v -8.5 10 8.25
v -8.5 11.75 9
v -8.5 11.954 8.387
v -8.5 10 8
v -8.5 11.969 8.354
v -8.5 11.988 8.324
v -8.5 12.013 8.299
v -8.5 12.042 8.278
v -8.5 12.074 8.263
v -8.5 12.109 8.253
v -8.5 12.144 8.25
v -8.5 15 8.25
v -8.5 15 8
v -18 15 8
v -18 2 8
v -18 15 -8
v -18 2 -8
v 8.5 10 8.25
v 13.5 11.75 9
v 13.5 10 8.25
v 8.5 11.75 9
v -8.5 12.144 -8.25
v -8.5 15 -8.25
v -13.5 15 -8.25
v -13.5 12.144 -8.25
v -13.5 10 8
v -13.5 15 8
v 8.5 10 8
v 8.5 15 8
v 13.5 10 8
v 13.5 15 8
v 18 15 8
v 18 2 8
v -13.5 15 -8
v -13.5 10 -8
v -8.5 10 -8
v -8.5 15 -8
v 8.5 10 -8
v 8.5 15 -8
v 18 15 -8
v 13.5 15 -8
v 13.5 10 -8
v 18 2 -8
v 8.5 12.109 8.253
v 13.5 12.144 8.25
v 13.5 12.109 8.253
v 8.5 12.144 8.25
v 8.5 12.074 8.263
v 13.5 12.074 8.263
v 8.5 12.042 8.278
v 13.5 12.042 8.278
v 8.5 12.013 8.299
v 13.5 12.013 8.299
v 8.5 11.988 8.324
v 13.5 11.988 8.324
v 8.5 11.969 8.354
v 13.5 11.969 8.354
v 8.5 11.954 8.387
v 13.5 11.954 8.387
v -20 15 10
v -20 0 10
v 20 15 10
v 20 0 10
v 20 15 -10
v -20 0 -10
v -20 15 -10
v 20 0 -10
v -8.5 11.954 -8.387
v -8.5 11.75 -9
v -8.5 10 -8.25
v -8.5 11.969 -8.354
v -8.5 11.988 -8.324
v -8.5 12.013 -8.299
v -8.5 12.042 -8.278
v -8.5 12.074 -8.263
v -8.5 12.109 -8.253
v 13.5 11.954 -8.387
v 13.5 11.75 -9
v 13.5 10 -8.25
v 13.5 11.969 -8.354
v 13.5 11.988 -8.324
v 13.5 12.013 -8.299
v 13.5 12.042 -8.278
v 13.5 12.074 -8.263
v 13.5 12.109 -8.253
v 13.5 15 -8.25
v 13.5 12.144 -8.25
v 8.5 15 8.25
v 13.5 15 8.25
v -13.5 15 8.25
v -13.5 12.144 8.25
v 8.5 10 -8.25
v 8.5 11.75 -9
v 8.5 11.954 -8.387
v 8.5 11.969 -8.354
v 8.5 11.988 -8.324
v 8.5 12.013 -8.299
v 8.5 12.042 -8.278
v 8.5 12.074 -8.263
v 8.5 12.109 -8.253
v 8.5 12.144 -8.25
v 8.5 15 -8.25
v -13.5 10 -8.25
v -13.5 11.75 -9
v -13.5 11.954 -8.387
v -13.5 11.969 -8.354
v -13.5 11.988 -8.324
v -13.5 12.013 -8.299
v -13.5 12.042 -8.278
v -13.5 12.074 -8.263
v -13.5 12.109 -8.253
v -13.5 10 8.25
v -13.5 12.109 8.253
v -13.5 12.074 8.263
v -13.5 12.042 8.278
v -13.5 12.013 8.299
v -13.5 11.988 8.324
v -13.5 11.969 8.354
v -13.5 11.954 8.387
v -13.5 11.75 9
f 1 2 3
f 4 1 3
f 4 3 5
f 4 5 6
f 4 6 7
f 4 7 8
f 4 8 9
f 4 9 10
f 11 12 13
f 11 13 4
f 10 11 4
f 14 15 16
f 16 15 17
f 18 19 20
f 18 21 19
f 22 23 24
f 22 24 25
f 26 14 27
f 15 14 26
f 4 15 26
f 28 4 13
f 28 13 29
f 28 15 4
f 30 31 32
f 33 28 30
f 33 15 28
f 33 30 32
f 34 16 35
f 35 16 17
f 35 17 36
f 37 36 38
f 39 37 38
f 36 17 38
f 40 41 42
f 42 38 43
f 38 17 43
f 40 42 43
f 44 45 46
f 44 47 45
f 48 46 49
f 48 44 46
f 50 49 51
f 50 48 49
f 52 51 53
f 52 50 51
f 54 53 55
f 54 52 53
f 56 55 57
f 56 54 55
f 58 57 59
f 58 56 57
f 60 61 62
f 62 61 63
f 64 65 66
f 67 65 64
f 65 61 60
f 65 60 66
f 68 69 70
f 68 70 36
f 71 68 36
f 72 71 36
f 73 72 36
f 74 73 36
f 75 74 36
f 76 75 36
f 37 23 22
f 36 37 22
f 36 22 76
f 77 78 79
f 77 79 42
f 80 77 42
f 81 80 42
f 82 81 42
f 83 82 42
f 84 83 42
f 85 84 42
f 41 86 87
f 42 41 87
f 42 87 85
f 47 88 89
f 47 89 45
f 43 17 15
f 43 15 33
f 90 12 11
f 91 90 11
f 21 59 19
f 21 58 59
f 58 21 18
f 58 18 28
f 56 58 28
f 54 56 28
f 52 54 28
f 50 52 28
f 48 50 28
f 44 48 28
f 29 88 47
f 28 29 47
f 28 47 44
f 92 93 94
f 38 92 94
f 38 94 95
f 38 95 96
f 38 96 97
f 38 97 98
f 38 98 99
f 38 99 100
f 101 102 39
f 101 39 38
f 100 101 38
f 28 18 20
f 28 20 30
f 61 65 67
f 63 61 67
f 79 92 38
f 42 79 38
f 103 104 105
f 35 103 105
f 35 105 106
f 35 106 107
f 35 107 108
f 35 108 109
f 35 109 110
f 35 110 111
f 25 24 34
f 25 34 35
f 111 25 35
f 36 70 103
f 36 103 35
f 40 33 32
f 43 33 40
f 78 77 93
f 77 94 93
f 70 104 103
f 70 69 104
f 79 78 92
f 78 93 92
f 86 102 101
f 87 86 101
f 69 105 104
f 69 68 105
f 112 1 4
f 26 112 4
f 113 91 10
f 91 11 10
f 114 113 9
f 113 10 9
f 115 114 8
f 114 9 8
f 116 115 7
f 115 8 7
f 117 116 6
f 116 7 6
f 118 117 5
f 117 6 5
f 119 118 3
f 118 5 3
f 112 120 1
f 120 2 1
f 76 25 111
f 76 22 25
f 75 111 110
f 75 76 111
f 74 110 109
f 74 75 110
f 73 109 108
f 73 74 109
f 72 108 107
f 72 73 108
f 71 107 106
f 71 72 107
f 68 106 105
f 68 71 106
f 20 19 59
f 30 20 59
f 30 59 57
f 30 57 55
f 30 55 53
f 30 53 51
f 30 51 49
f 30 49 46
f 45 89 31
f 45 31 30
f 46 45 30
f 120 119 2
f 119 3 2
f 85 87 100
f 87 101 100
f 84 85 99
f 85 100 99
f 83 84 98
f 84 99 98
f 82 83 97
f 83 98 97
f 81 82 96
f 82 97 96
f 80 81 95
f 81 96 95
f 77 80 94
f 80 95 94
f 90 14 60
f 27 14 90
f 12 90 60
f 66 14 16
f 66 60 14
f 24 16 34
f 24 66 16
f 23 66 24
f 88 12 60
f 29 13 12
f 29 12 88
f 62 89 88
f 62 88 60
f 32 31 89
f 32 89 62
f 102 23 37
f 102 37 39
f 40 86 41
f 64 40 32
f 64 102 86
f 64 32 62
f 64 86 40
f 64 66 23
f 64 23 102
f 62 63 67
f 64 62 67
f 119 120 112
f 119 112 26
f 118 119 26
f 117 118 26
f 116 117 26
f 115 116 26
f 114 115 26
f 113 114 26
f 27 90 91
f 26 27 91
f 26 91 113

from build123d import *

# Parameters (mm, degrees)
SKETCH1_W            = 40
SKETCH1_H            = 20
BOSS_EXTRUDE1_DEPTH  = 15
SHELL2_T             = -2
CUT_EXTRUDE1_START   = -11
CUT_EXTRUDE1_DEPTH   = 2.5
MIRROR2_START        = -11
MIRROR2_COPY_1_DEPTH = 2.5


with BuildPart() as part:
    # Sketch1 → Boss-Extrude1 (new body)
    with BuildSketch(Plane(origin=(0, 0, 0), x_dir=(1, 0, 0), z_dir=(0, 1, 0))):
        Rectangle(SKETCH1_W, SKETCH1_H)
    extrude(amount=BOSS_EXTRUDE1_DEPTH)

    # Shell2
    shell2_openings = [part.faces().sort_by_distance(p)[0] for p in [
        (0, 15, 0),
    ]]
    offset(amount=SHELL2_T, openings=shell2_openings, kind=Kind.INTERSECTION)

    # Sketch2 → Cut-Extrude1 (cut, symmetric)
    with BuildSketch(Plane(origin=(0, 0, 0), x_dir=(0, 0, -1), z_dir=(1, 0, 0)).offset(CUT_EXTRUDE1_START)):
        with BuildLine():
            Line((8.25, 15), (8.25, 12.144151844))
            ThreePointArc((8.25, 12.144151844), (8.287751563, 12.027209787), (8.386754447, 11.954415184))
            Line((8.386754447, 11.954415184), (9, 11.75))
            Line((9, 11.75), (8.25, 10))
            Line((8.25, 10), (7.25, 10))
            Line((7.25, 10), (7.25, 15))
            Line((7.25, 15), (8.25, 15))
        make_face()
    cut_extrude1 = extrude(amount=CUT_EXTRUDE1_DEPTH, both=True, mode=Mode.SUBTRACT)

    # Mirror1: Cut-Extrude1 across plane
    add(cut_extrude1.mirror(Plane(origin=(0, 0, 0), x_dir=(0, 0, 1), z_dir=(1, 0, 0))), mode=Mode.SUBTRACT)

    # Mirror2: Cut-Extrude1 across plane
    add(cut_extrude1.mirror(Plane.XY), mode=Mode.SUBTRACT)

    # Mirror2 copy 1 sketch → Mirror2 copy 1 (cut, symmetric)
    with BuildSketch(Plane.ZY.offset(MIRROR2_START)):
        with BuildLine():
            Line((8.25, 15), (8.25, 12.144151844))
            ThreePointArc((8.25, 12.144151844), (8.287751563, 12.027209787), (8.386754447, 11.954415184))
            Line((8.386754447, 11.954415184), (9, 11.75))
            Line((9, 11.75), (8.25, 10))
            Line((8.25, 10), (7.25, 10))
            Line((7.25, 10), (7.25, 15))
            Line((7.25, 15), (8.25, 15))
        make_face()
    extrude(amount=MIRROR2_COPY_1_DEPTH, both=True, mode=Mode.SUBTRACT)


solid = part.part
